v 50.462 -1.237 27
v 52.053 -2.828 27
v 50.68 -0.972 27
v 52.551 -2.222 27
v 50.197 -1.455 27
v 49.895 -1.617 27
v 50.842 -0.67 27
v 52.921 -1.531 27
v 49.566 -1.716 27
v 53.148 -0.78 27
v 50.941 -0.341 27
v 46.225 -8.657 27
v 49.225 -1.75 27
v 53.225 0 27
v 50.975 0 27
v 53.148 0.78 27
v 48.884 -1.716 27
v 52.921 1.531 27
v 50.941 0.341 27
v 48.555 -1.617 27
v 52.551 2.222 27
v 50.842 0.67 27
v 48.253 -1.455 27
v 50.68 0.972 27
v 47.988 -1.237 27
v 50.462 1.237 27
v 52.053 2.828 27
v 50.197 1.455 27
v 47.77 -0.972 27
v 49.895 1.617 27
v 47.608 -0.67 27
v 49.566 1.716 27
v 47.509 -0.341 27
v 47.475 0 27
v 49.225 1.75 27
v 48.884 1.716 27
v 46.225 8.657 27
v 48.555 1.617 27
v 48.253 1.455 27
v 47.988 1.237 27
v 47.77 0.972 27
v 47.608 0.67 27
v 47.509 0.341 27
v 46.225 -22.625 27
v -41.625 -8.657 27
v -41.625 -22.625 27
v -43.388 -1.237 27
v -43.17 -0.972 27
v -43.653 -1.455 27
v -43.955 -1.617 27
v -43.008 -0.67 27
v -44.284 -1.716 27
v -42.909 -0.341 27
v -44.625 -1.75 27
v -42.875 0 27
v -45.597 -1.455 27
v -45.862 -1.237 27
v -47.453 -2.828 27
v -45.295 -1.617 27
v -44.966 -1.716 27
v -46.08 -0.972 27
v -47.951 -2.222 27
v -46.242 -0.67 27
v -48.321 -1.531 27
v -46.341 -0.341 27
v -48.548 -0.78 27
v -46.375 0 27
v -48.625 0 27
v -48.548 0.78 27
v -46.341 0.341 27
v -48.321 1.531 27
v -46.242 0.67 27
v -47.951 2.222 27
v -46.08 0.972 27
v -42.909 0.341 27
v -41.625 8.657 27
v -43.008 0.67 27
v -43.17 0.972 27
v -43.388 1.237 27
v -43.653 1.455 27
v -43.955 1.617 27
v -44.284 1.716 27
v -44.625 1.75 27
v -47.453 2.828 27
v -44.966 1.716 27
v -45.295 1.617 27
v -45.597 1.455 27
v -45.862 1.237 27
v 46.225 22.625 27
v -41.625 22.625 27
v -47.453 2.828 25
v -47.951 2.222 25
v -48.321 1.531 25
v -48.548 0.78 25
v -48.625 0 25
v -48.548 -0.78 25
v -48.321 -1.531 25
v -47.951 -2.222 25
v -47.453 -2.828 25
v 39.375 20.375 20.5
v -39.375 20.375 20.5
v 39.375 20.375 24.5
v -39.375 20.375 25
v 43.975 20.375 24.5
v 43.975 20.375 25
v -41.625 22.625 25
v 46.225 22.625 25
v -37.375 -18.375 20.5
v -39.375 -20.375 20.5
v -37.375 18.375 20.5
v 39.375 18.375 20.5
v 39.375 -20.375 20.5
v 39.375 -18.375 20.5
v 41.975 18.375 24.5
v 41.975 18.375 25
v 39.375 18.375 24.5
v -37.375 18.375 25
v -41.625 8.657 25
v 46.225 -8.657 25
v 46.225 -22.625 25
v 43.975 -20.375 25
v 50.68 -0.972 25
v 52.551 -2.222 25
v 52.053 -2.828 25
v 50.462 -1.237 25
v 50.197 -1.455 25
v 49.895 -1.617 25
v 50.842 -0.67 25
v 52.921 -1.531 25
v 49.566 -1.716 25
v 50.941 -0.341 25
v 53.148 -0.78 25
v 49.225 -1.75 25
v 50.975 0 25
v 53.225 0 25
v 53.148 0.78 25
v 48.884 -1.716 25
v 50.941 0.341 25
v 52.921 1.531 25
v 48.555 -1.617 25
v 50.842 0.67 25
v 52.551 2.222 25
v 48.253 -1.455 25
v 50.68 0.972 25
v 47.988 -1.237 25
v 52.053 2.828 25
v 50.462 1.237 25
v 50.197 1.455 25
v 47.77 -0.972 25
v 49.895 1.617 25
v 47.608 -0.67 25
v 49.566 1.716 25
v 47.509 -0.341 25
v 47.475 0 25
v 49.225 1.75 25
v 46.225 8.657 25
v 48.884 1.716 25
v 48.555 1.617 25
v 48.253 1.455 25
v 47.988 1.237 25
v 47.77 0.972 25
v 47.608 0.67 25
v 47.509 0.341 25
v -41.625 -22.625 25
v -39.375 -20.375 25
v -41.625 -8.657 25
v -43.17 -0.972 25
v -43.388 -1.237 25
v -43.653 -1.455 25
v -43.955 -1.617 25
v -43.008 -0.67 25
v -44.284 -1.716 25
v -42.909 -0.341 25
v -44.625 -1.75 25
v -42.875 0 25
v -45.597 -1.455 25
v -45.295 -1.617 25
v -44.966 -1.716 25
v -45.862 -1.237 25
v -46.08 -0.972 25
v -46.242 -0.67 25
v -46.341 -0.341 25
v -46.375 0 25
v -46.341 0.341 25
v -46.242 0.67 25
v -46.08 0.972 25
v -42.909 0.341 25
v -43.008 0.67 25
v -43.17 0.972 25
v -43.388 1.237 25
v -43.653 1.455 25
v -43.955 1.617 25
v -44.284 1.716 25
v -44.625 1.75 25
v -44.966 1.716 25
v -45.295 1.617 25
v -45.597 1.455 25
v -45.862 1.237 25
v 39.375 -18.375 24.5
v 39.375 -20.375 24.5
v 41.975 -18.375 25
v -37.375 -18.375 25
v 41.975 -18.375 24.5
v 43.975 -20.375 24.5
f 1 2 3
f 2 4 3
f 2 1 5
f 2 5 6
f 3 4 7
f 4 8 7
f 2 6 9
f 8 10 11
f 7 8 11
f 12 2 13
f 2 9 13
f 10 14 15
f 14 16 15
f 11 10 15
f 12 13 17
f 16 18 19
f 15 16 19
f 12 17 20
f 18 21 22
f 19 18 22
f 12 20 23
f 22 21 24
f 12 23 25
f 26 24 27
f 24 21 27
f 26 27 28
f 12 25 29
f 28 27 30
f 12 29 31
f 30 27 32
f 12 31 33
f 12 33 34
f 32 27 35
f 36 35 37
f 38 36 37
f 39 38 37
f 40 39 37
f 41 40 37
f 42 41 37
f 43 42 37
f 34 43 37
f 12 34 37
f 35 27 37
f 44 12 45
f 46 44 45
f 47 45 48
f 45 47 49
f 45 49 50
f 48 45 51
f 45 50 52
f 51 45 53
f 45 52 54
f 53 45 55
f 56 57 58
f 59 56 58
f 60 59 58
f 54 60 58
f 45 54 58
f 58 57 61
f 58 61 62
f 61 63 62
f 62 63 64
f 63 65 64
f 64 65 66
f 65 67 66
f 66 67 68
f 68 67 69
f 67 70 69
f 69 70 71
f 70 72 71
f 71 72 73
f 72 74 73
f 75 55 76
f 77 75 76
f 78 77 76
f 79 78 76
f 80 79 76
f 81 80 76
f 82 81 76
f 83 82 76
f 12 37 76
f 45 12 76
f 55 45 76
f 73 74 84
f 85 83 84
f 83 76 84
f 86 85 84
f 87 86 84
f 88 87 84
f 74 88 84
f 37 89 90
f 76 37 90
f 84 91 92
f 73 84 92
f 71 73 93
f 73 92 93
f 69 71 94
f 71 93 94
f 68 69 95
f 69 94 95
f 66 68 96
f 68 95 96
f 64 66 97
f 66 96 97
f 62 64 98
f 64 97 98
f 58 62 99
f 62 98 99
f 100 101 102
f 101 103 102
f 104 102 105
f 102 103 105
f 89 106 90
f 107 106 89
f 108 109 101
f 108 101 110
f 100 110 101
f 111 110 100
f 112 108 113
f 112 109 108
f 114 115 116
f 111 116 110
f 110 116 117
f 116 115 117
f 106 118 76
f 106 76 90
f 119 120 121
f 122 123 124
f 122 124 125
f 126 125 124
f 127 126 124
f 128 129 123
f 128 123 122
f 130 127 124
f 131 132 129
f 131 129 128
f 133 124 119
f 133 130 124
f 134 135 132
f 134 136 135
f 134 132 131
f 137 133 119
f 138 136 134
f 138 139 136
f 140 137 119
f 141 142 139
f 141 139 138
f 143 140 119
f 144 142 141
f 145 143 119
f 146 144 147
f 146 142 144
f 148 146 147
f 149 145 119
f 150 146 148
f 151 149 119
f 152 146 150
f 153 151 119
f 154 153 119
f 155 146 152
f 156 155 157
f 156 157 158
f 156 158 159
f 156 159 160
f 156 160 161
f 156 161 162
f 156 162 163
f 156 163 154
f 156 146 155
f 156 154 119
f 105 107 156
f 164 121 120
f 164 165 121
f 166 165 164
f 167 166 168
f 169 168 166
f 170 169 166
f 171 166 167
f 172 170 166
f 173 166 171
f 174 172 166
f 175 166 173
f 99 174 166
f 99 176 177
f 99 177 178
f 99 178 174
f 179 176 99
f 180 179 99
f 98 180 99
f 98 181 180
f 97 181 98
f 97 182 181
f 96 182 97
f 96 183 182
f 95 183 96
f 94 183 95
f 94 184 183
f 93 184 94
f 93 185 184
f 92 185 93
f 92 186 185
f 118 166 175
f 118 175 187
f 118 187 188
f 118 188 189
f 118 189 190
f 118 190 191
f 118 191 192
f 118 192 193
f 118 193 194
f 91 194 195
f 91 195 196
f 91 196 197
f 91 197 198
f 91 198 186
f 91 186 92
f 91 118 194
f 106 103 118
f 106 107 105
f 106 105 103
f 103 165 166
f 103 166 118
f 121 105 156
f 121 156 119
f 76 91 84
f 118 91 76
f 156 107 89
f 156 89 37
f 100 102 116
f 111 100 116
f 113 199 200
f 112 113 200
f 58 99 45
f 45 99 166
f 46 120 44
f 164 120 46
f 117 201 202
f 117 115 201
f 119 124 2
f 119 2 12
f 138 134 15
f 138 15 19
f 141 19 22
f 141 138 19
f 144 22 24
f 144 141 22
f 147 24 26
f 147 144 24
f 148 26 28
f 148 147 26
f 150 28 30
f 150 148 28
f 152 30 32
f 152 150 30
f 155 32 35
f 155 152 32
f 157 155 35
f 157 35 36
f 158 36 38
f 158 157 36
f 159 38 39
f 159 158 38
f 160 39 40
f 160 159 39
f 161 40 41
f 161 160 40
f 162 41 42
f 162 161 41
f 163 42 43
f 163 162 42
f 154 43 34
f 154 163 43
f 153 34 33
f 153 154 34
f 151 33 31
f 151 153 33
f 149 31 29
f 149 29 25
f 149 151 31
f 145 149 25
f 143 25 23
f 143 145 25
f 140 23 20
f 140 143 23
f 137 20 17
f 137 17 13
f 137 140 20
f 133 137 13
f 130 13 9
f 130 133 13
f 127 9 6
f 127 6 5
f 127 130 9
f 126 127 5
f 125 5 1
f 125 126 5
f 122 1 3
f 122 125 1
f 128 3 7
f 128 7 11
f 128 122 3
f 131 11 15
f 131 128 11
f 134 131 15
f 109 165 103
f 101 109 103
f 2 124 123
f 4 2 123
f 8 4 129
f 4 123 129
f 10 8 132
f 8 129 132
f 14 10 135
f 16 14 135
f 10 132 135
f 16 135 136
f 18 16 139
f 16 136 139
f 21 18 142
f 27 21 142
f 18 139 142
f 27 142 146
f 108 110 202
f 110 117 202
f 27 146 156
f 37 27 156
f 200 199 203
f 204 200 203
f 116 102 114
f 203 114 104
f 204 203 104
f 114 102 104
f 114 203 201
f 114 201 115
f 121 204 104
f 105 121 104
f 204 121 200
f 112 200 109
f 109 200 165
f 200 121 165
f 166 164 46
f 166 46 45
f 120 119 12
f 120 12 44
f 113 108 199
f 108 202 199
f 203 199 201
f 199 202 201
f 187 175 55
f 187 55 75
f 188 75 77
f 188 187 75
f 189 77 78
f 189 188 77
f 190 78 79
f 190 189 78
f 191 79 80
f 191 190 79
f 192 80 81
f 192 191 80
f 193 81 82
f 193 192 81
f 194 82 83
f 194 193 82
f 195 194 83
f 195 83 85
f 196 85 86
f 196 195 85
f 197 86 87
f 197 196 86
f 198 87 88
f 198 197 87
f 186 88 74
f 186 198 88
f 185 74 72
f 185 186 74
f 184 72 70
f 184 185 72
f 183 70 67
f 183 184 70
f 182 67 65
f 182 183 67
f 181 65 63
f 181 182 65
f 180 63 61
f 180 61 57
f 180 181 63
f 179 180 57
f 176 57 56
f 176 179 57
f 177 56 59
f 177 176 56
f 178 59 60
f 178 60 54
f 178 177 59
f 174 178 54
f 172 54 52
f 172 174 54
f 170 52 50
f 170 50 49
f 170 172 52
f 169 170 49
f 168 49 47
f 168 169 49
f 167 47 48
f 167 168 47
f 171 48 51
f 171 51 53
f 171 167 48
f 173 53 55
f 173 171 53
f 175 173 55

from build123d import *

# Parameters (mm, degrees)
SKETCH087_W   = 83.35
SKETCH087_H   = 40.75
SKETCH087_W_2 = 79.35
SKETCH087_H_2 = 36.75
PAD056_DEPTH  = 0.5
SKETCH088_R   = 1.75
PAD057_DEPTH  = 2
PAD058_DEPTH  = 4


with BuildPart() as part:
    # Sketch087 → Pad056 (new body)
    with BuildSketch(Plane.XY):
        with Locations((2.3, 0)):
            Rectangle(SKETCH087_W, SKETCH087_H)
        with Locations((2.3, 0)):
            Rectangle(SKETCH087_W_2, SKETCH087_H_2, mode=Mode.SUBTRACT)
    extrude(amount=PAD056_DEPTH)

    # Sketch088 (on Face10 of Pad056) → Pad057 (join)
    with BuildSketch(Plane.XY.offset(0.5)):
        with BuildLine():
            Line((-41.625, 22.625), (46.225, 22.625))
            Line((46.225, 22.625), (46.225, 8.656854))
            Line((52.053427, 2.828427), (46.225, 8.656854))
            ThreePointArc((52.053427, -2.828427), (53.225, 0), (52.053427, 2.828427))
            Line((52.053427, -2.828427), (46.225, -8.656854))
            Line((46.225, -8.656854), (46.225, -22.625))
            Line((46.225, -22.625), (-41.625, -22.625))
            Line((-41.625, -22.625), (-41.625, -8.656854))
            Line((-47.453427, -2.828427), (-41.625, -8.656854))
            ThreePointArc((-47.453427, 2.828427), (-48.625, 0), (-47.453427, -2.828427))
            Line((-47.453427, 2.828427), (-41.625, 8.656854))
            Line((-41.625, 8.656854), (-41.625, 22.625))
        make_face()
        with Locations((-44.625, 0)):
            Circle(SKETCH088_R, mode=Mode.SUBTRACT)
        with Locations((49.225, 0)):
            Circle(SKETCH088_R, mode=Mode.SUBTRACT)
    extrude(amount=PAD057_DEPTH)

    # Sketch089 (on Face21 of Pad057) → Pad058 (join)
    with BuildSketch(Plane(origin=(0, 0, 0), x_dir=(1, 0, 0), z_dir=(0, 0, -1))):
        Polygon((-39.375, 20.375), (-39.375, -20.375), (39.375, -20.375), (39.375, -18.375), (-37.375, -18.375), (-37.375, 18.375), (39.375, 18.375), (39.375, 20.375), align=None)
    extrude(amount=PAD058_DEPTH)


with BuildPart() as part_1:
    # Body019 placement: moved
    add(part.part.moved(Location((0, 0, 24.5))))


solid = part_1.part
